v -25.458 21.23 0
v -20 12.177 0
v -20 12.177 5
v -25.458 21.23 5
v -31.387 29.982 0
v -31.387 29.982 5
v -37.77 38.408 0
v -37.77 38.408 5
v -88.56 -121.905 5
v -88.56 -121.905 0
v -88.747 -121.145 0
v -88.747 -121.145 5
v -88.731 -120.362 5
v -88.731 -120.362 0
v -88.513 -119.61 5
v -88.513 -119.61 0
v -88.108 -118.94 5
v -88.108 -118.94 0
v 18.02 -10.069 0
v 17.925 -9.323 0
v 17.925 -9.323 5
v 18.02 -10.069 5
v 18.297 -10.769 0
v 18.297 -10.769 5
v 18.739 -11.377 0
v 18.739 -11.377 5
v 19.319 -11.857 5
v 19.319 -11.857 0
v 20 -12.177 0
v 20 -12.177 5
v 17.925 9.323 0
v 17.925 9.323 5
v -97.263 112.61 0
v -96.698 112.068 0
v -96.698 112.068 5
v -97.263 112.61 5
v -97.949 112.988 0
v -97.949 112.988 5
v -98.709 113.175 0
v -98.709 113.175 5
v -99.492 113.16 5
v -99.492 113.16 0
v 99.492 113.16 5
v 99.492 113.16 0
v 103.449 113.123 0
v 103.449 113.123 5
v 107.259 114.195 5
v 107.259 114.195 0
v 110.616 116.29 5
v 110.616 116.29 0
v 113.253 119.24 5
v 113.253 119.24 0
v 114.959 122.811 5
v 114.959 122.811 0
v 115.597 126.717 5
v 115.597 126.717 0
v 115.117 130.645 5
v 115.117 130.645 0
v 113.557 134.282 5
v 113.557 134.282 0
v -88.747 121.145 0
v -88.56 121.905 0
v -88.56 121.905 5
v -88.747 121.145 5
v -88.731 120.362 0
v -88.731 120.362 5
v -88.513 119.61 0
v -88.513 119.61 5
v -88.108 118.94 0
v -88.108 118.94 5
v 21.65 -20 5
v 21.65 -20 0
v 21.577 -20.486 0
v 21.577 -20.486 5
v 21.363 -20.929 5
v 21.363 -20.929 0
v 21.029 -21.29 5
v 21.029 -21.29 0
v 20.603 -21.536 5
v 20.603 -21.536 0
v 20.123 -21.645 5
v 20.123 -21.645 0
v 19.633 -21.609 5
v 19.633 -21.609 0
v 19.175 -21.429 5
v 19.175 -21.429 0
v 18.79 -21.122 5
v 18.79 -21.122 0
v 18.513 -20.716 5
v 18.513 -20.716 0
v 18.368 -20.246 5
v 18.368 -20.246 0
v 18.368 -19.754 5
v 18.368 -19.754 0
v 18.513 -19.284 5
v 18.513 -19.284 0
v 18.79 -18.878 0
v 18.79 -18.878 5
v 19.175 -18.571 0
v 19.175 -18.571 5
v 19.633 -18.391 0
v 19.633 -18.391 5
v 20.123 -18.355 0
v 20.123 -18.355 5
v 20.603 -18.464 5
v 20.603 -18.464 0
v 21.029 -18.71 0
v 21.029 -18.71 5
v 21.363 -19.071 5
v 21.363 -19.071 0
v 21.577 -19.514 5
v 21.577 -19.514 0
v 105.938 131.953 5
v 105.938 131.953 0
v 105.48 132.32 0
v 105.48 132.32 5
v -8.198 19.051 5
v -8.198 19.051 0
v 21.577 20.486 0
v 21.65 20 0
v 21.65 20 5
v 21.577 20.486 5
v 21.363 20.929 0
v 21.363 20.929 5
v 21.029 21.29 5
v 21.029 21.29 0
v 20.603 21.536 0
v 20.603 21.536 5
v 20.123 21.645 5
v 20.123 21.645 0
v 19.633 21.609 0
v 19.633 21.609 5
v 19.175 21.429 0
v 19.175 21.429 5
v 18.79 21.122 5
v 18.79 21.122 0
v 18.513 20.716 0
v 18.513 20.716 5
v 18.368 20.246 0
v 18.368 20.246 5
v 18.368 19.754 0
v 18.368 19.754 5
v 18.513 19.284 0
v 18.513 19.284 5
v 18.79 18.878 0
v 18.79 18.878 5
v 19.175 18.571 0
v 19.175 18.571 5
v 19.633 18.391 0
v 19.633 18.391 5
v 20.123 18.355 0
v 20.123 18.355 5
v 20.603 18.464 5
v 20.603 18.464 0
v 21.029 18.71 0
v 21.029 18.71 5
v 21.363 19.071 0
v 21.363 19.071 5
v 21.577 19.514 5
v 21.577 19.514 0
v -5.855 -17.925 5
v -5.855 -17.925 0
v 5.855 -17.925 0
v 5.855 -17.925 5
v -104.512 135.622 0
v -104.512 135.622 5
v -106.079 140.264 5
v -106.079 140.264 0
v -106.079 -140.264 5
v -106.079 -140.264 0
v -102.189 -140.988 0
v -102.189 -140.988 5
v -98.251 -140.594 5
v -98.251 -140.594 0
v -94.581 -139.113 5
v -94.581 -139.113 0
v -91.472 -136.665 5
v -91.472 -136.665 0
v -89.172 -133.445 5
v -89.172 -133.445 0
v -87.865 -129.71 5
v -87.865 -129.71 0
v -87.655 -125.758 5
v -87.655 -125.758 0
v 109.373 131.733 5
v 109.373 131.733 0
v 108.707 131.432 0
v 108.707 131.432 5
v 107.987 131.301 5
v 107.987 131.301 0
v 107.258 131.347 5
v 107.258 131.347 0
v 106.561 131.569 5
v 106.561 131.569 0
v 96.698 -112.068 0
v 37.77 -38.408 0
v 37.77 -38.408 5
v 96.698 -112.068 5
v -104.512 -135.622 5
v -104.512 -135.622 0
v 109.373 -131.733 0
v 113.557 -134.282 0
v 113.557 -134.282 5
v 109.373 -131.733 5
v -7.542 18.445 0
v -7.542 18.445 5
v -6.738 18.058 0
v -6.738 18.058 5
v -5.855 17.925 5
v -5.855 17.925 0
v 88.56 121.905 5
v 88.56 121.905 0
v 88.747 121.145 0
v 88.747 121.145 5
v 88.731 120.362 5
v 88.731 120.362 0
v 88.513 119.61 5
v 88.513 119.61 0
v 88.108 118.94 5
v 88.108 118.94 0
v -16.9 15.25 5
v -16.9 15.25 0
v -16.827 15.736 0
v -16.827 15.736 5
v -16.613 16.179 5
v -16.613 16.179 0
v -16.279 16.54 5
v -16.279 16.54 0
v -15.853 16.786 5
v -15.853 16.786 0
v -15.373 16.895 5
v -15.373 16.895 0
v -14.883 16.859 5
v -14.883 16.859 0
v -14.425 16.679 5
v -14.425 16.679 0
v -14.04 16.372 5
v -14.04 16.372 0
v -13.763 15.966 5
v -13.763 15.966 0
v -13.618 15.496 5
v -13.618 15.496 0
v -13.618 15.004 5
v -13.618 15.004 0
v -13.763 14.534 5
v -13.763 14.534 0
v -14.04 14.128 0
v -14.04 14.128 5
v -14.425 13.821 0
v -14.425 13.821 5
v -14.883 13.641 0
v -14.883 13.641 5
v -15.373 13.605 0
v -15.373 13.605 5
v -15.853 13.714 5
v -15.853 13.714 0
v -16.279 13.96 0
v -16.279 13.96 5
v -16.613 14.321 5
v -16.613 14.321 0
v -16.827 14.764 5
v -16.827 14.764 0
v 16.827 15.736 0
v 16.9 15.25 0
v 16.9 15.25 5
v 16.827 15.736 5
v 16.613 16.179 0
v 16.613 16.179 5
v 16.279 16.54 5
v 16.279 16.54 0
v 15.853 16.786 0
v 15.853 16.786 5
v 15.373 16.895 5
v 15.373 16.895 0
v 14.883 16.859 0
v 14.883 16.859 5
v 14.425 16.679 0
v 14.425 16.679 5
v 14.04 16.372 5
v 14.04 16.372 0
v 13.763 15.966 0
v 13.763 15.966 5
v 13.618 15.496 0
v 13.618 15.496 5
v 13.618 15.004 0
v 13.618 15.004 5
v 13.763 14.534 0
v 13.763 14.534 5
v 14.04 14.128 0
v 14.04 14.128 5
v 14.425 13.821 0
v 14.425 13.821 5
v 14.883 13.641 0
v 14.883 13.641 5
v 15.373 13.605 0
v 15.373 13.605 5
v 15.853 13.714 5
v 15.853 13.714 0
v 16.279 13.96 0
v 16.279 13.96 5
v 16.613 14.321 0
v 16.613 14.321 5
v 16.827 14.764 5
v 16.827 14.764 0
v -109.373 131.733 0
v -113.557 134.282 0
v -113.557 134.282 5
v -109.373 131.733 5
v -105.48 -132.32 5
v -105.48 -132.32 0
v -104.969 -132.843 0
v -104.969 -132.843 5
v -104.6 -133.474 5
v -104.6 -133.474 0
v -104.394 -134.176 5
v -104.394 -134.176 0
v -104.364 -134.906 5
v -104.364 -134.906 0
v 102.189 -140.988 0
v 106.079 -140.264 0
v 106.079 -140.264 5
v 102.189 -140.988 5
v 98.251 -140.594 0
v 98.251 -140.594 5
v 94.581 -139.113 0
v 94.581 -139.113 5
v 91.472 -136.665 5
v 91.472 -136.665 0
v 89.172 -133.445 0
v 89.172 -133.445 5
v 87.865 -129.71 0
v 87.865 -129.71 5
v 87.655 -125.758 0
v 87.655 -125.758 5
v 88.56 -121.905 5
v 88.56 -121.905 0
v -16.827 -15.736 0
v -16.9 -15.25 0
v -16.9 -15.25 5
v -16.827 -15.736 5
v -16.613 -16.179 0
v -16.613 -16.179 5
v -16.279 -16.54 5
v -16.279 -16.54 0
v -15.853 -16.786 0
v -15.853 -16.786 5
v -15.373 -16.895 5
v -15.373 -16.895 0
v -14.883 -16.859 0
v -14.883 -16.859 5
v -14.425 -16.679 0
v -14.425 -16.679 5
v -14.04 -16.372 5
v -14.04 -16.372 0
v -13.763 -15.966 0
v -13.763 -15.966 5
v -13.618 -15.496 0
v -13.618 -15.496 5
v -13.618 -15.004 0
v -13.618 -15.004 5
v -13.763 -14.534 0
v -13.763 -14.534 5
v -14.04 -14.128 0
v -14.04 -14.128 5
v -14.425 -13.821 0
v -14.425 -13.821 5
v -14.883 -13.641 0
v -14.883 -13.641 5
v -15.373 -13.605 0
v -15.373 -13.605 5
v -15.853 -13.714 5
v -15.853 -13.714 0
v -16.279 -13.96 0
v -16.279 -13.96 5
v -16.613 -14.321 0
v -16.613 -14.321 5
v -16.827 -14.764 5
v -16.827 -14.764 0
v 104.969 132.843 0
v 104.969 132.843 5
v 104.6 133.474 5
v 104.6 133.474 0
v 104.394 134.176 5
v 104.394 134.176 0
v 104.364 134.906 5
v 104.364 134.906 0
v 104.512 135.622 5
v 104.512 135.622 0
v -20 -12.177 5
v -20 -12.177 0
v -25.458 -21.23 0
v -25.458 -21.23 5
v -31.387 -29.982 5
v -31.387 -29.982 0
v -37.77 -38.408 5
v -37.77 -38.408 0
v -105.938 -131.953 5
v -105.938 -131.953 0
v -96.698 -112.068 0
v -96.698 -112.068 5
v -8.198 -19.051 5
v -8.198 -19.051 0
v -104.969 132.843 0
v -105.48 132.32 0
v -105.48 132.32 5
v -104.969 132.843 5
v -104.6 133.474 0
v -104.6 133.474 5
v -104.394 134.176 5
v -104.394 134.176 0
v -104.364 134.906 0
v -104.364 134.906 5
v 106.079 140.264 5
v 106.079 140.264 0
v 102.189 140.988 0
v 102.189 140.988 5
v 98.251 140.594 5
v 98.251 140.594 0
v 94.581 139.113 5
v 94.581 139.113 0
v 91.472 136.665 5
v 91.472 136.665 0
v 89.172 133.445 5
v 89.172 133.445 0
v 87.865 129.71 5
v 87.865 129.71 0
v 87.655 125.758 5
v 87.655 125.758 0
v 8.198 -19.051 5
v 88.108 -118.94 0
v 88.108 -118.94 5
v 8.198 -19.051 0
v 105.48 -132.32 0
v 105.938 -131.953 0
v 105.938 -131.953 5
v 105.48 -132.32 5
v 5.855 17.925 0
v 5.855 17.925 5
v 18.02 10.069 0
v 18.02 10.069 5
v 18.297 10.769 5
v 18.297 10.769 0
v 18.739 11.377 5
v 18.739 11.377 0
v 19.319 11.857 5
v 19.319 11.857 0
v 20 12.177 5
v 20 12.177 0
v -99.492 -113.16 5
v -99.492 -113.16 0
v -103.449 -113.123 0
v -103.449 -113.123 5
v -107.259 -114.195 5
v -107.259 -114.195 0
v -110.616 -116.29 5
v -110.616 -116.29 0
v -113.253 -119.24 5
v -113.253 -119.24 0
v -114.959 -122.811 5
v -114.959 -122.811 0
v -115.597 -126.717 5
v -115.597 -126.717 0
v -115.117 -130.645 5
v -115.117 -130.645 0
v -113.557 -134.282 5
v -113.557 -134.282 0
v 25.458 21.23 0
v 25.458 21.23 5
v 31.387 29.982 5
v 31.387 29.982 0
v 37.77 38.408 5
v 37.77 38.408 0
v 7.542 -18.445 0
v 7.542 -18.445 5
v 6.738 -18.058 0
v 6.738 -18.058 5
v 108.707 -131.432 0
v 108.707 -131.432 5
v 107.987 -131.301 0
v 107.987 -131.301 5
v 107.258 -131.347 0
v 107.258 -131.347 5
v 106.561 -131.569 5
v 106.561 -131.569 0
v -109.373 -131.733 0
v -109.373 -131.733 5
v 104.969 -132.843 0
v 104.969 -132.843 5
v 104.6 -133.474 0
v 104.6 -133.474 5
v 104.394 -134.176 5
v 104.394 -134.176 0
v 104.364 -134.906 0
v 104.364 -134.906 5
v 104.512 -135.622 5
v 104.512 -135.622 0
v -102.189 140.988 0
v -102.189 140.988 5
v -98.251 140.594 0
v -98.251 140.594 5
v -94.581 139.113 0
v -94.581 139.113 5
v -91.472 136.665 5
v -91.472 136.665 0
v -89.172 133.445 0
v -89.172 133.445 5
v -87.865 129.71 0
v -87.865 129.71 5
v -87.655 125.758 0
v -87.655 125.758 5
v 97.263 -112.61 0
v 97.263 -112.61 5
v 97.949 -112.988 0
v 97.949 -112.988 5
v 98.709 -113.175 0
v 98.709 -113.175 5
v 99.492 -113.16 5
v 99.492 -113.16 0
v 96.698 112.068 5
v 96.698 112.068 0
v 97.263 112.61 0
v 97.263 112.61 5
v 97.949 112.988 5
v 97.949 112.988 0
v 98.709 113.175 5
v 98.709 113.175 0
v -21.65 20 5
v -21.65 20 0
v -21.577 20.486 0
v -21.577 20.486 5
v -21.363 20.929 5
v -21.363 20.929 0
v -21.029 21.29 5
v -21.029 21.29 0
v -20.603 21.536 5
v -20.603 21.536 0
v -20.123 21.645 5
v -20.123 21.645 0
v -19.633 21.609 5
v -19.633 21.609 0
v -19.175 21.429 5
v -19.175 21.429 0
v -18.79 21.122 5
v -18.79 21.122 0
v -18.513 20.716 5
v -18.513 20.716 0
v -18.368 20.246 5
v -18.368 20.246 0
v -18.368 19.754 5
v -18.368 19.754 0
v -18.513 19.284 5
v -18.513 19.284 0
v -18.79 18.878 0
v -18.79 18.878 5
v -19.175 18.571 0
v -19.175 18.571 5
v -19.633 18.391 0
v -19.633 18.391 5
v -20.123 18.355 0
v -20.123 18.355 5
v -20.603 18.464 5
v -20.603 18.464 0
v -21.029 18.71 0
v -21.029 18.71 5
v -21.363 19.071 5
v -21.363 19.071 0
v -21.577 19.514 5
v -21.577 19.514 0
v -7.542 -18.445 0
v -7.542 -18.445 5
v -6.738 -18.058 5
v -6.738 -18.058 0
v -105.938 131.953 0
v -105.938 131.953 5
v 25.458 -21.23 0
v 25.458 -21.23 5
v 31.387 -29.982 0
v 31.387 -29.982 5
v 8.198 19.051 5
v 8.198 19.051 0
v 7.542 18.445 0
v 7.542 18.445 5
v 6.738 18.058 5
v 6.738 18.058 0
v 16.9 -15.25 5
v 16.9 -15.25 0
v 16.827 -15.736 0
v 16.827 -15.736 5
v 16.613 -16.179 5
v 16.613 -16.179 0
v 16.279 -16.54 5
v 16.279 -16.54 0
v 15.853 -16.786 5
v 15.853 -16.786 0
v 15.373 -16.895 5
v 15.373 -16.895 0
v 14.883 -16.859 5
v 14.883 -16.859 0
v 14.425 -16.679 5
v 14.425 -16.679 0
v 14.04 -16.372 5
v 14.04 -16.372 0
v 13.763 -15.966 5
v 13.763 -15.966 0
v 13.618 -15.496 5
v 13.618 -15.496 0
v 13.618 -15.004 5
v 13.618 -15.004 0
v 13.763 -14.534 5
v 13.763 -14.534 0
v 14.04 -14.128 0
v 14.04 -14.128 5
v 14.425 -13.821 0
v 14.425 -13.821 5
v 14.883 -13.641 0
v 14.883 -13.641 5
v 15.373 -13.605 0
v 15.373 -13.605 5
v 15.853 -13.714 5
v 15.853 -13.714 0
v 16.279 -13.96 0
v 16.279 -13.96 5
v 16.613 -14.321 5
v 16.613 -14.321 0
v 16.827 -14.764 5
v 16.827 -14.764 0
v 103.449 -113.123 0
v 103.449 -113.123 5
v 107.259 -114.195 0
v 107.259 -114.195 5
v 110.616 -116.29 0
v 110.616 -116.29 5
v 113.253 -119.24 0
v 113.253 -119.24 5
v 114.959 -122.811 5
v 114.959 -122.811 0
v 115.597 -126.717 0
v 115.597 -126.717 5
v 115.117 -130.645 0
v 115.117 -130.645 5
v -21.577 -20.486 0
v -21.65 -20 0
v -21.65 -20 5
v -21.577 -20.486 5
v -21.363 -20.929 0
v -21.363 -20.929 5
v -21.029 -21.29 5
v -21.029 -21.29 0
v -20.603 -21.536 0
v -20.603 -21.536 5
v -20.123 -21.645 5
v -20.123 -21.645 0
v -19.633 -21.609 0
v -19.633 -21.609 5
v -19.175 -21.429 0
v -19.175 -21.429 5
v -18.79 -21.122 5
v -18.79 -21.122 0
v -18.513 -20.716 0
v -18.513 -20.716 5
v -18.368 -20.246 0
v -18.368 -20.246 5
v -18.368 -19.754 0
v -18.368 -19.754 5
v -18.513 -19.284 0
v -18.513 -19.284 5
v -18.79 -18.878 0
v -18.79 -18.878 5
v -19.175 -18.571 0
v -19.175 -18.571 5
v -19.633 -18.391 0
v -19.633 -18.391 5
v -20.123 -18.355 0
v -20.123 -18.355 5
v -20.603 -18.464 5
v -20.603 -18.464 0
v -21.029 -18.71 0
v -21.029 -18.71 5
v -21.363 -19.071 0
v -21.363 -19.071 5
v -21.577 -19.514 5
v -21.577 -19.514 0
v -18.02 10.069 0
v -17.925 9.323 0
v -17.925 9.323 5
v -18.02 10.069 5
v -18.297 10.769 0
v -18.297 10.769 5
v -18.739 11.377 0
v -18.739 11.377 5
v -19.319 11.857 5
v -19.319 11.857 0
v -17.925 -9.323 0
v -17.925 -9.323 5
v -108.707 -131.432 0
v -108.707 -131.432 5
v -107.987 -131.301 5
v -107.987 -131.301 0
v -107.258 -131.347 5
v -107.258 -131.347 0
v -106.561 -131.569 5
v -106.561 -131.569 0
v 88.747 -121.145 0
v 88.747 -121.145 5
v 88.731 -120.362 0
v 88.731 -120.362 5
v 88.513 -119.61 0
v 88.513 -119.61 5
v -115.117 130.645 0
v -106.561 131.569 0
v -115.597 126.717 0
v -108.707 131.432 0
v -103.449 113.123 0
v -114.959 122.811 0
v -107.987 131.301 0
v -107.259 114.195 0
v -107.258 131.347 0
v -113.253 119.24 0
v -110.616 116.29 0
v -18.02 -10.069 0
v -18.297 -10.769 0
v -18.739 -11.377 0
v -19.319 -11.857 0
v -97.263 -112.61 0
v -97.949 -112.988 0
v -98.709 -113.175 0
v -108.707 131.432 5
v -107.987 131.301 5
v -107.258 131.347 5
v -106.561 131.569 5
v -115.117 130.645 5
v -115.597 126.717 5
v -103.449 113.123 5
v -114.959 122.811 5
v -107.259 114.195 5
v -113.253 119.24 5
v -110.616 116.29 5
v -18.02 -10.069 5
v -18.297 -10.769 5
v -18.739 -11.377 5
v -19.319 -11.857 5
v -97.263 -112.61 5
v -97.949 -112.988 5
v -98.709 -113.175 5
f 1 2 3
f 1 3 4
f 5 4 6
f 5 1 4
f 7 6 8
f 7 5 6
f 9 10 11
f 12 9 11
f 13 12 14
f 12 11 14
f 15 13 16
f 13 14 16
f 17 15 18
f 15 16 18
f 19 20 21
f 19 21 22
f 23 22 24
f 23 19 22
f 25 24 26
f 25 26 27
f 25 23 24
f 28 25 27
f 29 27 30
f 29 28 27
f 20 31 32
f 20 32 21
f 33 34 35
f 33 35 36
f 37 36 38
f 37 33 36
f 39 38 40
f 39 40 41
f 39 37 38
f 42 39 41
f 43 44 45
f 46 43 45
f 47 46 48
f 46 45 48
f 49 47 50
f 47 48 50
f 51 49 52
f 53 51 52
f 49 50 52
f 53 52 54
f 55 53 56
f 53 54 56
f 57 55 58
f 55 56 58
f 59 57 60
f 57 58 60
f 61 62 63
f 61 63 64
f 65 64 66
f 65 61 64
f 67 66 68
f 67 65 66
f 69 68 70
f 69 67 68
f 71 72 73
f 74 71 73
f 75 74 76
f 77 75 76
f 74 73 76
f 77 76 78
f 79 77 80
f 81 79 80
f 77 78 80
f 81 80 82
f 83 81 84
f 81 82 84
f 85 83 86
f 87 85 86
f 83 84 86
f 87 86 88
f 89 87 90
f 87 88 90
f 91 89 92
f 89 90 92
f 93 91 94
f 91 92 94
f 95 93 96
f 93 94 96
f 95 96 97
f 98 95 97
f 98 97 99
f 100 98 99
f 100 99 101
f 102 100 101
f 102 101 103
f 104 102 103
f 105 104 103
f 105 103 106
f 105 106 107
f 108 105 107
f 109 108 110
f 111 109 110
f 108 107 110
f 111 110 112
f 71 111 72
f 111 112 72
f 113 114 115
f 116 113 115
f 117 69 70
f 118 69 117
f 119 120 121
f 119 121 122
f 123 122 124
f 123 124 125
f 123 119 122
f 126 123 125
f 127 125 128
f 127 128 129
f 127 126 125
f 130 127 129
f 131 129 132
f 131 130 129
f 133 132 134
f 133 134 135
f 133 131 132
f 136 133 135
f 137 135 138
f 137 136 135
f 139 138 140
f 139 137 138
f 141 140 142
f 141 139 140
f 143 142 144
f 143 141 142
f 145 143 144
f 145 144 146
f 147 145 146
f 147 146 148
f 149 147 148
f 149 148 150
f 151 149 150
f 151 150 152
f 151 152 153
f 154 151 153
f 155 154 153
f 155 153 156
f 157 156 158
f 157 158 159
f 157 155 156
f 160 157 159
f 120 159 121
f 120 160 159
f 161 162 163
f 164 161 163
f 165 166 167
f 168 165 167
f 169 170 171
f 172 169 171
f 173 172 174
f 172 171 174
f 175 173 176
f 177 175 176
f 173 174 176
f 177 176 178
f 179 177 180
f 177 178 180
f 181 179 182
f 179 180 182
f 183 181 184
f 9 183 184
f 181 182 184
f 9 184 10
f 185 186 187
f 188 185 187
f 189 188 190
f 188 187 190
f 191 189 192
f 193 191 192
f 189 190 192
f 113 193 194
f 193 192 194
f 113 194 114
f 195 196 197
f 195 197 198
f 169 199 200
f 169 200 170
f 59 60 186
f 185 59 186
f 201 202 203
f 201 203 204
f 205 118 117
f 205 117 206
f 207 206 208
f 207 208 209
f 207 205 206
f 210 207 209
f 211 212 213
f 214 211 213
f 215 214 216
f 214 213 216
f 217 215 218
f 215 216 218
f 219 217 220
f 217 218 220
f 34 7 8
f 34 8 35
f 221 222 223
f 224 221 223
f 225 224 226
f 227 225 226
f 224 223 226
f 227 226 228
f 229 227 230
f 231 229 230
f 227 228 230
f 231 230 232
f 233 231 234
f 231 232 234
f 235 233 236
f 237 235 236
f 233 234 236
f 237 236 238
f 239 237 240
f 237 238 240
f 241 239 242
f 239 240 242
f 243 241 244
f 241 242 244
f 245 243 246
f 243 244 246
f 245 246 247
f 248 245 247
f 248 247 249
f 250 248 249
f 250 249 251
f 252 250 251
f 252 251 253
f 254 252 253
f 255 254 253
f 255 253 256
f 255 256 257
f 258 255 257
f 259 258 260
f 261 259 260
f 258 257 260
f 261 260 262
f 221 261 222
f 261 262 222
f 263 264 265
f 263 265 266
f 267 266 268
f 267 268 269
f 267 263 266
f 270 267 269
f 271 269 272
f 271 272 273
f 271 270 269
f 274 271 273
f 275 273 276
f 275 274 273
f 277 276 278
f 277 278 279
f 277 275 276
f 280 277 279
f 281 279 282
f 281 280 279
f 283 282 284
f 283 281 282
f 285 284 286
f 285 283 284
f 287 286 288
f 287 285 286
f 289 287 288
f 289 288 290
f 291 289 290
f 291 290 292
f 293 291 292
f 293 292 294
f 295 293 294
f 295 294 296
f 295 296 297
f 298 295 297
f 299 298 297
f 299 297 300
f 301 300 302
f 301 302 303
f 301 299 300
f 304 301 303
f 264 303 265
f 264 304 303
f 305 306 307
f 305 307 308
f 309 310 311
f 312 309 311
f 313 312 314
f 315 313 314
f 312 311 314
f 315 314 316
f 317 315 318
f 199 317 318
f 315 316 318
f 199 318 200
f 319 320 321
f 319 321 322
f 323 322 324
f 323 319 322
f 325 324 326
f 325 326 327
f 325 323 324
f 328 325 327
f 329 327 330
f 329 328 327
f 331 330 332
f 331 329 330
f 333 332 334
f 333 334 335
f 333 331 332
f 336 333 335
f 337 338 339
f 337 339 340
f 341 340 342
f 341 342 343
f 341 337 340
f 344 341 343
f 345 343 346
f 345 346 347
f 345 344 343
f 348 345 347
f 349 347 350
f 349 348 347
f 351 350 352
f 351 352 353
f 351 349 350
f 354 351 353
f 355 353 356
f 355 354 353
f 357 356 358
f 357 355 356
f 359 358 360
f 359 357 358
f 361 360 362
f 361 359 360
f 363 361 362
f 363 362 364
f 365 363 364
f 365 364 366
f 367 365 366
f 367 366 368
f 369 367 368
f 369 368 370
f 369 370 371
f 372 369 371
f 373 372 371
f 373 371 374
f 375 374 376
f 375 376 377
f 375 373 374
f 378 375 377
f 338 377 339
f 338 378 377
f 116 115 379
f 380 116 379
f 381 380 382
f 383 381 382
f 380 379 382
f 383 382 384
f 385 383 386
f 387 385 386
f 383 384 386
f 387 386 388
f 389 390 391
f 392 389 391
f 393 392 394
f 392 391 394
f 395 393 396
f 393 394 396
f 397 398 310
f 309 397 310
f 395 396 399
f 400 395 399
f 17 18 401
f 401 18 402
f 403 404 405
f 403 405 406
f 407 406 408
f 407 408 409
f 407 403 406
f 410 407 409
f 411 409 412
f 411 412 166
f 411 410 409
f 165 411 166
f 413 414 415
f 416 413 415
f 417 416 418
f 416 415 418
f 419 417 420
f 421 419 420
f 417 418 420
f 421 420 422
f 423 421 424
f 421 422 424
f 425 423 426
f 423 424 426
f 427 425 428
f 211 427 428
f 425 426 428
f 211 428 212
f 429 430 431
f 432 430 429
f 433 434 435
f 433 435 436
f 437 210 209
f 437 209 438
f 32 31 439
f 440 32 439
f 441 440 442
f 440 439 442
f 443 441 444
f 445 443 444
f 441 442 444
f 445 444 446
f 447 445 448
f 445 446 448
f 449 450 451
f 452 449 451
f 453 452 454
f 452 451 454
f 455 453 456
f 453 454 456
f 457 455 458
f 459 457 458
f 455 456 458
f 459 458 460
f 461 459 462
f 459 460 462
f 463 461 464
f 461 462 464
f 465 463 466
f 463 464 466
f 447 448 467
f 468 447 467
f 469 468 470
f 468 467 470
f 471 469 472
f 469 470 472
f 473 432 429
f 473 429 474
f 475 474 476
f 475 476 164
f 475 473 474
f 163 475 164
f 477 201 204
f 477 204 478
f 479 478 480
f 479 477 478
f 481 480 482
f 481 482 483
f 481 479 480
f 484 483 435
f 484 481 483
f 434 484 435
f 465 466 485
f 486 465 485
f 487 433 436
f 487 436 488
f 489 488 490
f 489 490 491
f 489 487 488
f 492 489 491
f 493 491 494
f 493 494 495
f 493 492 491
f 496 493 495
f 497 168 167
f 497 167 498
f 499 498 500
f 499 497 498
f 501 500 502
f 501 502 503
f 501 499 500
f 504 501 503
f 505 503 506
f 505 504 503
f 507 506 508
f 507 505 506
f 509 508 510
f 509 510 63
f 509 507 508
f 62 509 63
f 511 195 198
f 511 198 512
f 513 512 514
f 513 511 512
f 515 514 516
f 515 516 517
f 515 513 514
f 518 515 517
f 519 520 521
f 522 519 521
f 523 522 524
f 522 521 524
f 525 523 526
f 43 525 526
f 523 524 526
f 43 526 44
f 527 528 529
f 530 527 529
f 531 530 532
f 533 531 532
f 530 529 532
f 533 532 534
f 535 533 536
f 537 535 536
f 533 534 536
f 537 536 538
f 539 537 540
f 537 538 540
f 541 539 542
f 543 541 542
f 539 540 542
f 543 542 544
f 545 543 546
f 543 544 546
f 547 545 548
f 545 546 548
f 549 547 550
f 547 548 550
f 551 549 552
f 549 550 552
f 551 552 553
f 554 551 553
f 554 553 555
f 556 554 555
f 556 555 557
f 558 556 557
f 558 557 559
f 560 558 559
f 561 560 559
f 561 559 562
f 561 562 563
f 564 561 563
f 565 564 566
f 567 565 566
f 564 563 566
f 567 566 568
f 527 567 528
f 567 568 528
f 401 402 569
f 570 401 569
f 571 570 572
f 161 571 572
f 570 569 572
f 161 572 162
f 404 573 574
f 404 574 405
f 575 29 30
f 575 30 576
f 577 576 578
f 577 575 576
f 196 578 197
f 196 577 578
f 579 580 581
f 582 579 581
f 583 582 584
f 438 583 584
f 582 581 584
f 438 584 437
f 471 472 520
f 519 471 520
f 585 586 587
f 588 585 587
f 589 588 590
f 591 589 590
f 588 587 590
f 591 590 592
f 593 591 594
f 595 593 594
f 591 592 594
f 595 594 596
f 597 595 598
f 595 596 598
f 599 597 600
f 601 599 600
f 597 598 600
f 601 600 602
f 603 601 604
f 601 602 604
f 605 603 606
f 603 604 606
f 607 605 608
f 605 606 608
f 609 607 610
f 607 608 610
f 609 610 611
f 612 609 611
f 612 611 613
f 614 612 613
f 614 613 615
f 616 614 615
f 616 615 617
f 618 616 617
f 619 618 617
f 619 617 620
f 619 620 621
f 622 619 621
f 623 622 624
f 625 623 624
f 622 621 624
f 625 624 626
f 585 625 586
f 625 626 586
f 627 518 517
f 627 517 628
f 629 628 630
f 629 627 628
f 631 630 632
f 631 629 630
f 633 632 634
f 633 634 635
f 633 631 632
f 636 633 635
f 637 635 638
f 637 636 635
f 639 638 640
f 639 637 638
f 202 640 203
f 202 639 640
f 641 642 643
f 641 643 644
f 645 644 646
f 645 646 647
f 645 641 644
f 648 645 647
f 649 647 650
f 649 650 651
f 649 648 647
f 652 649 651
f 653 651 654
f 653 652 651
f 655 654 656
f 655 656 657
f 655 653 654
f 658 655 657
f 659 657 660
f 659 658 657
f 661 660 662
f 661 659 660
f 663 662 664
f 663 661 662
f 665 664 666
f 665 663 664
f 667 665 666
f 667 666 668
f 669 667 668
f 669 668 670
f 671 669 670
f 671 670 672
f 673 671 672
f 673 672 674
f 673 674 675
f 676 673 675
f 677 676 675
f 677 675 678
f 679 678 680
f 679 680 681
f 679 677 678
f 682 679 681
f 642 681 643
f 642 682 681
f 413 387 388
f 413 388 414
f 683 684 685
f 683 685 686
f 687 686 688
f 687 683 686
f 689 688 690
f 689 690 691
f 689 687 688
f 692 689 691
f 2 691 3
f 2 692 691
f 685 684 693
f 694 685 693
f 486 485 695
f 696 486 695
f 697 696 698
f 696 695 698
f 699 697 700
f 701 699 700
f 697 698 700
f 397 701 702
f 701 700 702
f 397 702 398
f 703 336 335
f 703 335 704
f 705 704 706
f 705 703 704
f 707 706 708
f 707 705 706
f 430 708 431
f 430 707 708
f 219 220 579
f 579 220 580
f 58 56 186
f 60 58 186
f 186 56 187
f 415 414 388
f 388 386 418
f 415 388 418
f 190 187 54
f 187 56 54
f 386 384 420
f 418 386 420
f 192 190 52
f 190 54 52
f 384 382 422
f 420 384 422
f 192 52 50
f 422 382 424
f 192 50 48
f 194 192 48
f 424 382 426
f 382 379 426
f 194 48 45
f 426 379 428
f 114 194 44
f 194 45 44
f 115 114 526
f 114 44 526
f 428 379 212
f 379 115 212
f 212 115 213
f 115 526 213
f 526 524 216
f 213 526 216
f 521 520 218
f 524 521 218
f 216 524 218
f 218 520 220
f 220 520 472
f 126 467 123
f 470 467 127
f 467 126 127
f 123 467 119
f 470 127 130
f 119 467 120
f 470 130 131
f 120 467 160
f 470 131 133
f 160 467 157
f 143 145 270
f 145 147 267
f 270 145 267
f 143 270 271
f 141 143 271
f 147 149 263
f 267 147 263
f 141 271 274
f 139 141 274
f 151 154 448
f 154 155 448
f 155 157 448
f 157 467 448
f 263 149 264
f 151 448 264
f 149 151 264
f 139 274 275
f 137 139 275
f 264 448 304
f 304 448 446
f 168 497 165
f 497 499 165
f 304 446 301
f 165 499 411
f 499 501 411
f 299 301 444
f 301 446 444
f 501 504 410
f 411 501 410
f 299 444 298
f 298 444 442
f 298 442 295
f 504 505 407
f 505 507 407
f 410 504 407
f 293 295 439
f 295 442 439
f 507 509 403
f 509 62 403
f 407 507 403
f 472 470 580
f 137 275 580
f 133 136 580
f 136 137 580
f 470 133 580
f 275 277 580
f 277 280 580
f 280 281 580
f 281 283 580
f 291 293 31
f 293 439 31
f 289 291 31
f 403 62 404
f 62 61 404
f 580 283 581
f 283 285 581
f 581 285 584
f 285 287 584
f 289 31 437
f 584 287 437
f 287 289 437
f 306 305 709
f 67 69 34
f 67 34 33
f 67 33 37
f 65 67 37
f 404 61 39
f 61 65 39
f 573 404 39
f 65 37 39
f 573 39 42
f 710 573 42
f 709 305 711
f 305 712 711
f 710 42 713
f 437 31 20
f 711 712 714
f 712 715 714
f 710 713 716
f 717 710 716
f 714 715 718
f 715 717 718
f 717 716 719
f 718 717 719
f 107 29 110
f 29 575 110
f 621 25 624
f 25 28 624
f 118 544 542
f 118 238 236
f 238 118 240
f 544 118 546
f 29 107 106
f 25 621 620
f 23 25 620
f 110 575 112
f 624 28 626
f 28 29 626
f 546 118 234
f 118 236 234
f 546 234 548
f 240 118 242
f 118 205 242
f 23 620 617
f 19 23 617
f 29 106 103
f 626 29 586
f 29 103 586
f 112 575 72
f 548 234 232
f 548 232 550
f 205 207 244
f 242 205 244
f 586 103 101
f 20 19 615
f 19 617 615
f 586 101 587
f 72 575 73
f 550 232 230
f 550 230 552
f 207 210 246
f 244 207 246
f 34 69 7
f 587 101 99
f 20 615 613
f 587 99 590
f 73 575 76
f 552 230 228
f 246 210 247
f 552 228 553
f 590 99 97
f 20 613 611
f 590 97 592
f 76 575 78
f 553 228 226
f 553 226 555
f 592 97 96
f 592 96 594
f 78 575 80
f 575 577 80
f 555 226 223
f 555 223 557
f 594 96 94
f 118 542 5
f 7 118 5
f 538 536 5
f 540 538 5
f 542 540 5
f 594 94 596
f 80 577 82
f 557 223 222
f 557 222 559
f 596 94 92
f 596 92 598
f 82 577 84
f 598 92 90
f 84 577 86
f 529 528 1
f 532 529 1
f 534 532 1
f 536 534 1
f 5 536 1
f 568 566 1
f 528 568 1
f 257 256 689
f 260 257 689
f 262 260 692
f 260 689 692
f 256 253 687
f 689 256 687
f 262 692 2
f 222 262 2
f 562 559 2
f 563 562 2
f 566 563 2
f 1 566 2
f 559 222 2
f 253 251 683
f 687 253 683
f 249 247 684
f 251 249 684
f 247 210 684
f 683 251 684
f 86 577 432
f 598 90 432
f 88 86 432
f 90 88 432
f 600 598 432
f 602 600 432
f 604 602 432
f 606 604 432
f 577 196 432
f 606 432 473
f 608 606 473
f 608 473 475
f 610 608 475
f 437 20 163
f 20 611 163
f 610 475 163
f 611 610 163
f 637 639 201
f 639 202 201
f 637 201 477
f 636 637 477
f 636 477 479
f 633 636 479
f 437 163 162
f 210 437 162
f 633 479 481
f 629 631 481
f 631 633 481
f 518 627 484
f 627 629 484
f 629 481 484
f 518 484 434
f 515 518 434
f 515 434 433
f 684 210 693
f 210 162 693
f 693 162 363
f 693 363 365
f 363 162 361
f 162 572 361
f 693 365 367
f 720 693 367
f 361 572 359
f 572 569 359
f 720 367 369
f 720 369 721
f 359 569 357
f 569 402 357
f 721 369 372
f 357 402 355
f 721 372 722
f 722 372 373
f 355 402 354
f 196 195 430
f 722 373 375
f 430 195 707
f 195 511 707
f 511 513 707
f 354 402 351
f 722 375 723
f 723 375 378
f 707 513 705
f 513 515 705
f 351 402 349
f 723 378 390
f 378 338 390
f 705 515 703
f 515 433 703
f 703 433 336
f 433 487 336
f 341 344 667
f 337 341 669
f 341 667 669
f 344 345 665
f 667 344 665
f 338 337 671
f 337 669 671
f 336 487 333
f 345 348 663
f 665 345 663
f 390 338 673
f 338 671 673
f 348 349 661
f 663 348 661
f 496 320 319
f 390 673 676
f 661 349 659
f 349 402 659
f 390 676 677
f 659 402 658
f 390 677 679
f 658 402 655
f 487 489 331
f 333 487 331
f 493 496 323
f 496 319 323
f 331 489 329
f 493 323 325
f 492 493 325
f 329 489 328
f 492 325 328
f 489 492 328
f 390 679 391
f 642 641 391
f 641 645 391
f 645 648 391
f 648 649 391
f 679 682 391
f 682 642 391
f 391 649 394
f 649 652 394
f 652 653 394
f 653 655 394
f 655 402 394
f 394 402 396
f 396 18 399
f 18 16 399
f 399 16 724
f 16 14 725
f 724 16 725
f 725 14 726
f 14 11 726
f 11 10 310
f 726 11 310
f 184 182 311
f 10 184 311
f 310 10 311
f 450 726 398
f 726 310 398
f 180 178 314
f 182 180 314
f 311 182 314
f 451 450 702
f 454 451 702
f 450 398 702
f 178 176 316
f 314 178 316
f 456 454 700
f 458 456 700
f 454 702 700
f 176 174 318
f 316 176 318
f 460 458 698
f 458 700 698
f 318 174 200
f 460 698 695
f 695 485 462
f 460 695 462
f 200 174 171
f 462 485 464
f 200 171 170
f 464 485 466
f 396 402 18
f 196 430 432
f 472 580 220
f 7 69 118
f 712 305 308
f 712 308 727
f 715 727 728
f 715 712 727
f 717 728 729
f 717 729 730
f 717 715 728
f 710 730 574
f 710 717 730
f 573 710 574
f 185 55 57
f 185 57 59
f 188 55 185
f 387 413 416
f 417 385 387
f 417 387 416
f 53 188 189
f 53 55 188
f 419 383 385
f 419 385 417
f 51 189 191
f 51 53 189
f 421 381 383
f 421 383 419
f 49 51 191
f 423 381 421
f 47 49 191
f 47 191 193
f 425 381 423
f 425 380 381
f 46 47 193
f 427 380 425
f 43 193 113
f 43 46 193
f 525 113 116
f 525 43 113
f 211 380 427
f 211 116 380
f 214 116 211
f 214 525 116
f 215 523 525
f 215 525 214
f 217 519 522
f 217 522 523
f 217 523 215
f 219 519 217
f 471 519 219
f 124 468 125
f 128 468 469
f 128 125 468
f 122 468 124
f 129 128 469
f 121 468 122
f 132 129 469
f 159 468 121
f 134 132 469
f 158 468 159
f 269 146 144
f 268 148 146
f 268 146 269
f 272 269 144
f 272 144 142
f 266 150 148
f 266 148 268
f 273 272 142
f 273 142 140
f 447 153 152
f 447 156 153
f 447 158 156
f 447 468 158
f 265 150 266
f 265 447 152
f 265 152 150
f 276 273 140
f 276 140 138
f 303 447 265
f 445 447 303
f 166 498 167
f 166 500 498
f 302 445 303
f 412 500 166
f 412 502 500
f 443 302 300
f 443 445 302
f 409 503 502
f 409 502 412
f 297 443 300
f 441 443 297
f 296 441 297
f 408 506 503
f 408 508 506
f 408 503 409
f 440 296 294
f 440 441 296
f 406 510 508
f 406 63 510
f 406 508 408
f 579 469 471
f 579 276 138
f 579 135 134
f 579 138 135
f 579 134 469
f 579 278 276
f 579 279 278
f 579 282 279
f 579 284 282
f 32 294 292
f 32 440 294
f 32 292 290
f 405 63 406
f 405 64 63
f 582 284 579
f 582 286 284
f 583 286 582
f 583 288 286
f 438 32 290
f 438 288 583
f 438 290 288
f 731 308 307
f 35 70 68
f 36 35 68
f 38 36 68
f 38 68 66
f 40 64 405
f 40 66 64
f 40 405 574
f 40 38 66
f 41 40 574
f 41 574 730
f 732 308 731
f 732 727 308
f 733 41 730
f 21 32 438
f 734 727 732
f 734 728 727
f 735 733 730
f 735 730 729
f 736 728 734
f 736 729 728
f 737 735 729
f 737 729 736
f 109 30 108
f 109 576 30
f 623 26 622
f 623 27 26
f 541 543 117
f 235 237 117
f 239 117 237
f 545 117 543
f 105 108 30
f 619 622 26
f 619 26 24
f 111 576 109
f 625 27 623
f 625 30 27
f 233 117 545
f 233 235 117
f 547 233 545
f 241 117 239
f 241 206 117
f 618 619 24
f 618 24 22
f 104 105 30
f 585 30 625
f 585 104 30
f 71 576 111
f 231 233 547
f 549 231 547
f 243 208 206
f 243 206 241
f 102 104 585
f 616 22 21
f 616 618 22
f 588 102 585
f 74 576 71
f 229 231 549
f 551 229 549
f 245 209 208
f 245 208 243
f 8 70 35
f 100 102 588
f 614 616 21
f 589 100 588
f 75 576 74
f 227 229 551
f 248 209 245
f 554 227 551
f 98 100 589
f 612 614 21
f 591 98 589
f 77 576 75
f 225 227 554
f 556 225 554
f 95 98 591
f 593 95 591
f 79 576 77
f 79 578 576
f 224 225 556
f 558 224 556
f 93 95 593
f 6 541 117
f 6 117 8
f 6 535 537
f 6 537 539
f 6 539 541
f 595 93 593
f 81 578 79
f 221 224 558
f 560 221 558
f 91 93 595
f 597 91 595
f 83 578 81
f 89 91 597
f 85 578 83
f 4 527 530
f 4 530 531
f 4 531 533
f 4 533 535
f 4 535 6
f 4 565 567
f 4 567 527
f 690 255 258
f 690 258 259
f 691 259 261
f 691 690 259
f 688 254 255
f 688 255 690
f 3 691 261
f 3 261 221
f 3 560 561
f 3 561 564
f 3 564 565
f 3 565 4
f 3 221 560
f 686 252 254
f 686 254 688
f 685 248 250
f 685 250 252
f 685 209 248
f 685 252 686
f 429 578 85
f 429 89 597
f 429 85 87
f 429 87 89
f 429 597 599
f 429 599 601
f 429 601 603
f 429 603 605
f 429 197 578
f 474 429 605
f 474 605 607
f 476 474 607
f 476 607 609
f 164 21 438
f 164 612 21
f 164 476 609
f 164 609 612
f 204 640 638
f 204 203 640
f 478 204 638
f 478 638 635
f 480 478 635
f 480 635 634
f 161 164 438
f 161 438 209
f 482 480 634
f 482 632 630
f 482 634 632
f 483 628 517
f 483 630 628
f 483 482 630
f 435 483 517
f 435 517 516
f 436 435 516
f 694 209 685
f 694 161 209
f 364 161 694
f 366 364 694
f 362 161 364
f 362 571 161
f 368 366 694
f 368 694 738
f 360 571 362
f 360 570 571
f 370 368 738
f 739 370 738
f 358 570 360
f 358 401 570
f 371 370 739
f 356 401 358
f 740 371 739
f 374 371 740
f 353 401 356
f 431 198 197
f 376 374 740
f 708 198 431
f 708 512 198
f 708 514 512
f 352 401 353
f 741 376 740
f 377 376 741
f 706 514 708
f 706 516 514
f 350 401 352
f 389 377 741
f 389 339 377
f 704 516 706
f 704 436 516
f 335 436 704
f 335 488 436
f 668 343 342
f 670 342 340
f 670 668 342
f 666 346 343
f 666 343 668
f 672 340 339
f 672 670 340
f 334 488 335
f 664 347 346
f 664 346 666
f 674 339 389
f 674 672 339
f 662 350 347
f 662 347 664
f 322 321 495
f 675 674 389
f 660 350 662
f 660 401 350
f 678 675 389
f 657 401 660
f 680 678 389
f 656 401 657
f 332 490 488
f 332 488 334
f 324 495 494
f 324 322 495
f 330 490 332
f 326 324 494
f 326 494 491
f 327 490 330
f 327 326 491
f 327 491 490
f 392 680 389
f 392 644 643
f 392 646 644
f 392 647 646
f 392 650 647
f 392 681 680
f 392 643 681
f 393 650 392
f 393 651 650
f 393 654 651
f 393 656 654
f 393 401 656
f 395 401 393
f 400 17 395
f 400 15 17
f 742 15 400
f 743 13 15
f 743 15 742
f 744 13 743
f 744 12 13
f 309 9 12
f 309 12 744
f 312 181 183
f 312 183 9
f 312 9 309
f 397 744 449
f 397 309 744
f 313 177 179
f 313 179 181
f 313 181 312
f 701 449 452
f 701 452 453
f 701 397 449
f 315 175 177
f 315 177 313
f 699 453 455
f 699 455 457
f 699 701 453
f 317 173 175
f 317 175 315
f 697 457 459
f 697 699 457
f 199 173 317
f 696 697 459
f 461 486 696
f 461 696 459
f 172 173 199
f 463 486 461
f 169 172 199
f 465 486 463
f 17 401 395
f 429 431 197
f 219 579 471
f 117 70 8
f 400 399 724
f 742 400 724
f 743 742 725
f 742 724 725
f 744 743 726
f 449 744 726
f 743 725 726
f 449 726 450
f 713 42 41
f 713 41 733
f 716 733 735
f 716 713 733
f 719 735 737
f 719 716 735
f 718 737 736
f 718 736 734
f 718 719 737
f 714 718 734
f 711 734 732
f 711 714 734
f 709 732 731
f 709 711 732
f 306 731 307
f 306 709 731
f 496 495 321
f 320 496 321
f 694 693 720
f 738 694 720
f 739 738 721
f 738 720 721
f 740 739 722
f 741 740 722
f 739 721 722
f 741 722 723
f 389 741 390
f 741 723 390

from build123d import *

# Parameters (mm, degrees)
F0_R        = 1.65
F1_DEPTH    = 5
F2_T1_DEPTH = 5
F3_T1_DEPTH = 5


# Not quite as in the source:
# - a fillet or chamfer that OpenCascade refuses, or shapes differently, is made with other operations: its cross-section is extruded or revolved along the edge and cut away or added


with BuildPart() as f1:
    # F0 (on Top) → F1 (new body)
    with BuildSketch(Plane.XY):
        Polygon((7.0434366612, 0), (14.0868733224, 0), (17.9254915565, 0), (17.9254915565, 12.1765555814), (17.9254915565, 13.6025686192), align=None)
        Polygon((0, 0), (7.0434366612, 0), (17.9254915565, 13.6025686192), (17.9254915565, 17.9254915565), (7.296956584, 17.9254915565), (0, 8.8042958265), align=None)
        with Locations((15.25, 15.25)):
            Circle(F0_R, mode=Mode.SUBTRACT)
        with BuildLine():
            Line((17.9254915565, 17.9254915565), (17.9254915565, 13.6025686192))
            Line((17.9254915565, 13.6025686192), (17.9254915565, 12.1765555814))
            Line((17.9254915565, 12.1765555814), (20, 12.1765555814))
            Line((20, 12.1765555814), (23.3218736491, 20.3480462349))
            Line((23.3218736491, 20.3480462349), (97.8522087861, 113.5109651562))
            ThreePointArc((97.8522087861, 113.5109651562), (92.8542693342, 116.0678366678), (89.2626518823, 120.3826106793))
            Line((89.2626518823, 120.3826106793), (7.296956584, 17.9254915565))
            Line((7.296956584, 17.9254915565), (17.9254915565, 17.9254915565))
        make_face()
        with Locations((20, 20)):
            Circle(F0_R, mode=Mode.SUBTRACT)
        Polygon((0, 17.9254915565), (0, 8.8042958265), (7.296956584, 17.9254915565), align=None)
        with BuildLine():
            ThreePointArc((106.0792785003, 140.2640892683), (90.9109583101, 136.0412602966), (89.2626518823, 120.3826106793))
            ThreePointArc((89.2626518823, 120.3826106793), (92.8542693342, 116.0678366678), (97.8522087861, 113.5109651562))
            ThreePointArc((97.8522087861, 113.5109651562), (112.7671167579, 118.5563335383), (113.5573186397, 134.2816571567))
            Line((113.5573186397, 134.2816571567), (107.5786593199, 130.6408285784))
            Line((107.5786593199, 130.6408285784), (103.8396392501, 133.6320446341))
            Line((103.8396392501, 133.6320446341), (106.0792785003, 140.2640892683))
        make_face()
    extrude(amount=F1_DEPTH)

    # F2: fillet of radius 3 on 6 edges, made by hand

    # F2_s2 → F2_t1 (join)
    with BuildSketch(Plane.XY):
        with BuildLine():
            ThreePointArc((8.1976884699, 19.0514064139), (7.1546482331, 18.2215818476), (5.8550820416, 17.9254915565))
            Line((5.8550820416, 17.9254915565), (7.296956584, 17.9254915565))
            Line((7.296956584, 17.9254915565), (8.1976884699, 19.0514064139))
        make_face()
        with BuildLine():
            ThreePointArc((17.9254915565, 9.3228798152), (18.4989225106, 11.0868987111), (20, 12.1765555814))
            Line((20, 12.1765555814), (17.9254915565, 12.1765555814))
            Line((17.9254915565, 12.1765555814), (17.9254915565, 9.3228798152))
        make_face()
        with BuildLine():
            ThreePointArc((96.6977481783, 112.0678893964), (97.9486405, 112.9881128103), (99.4920567349, 113.1596035031))
            ThreePointArc((99.4920567349, 113.1596035031), (98.6668668075, 113.3107074808), (97.8522087861, 113.5109651562))
            Line((97.8522087861, 113.5109651562), (96.6977481783, 112.0678893964))
        make_face()
        with BuildLine():
            ThreePointArc((88.5598934027, 121.9053341689), (88.7313840955, 120.361917934), (88.1081912745, 118.9395349195))
            Line((88.1081912745, 118.9395349195), (89.2626518823, 120.3826106793))
            ThreePointArc((89.2626518823, 120.3826106793), (88.8884511699, 121.1334399909), (88.5598934027, 121.9053341689))
        make_face()
        with BuildLine():
            ThreePointArc((105.4799499303, 132.31979609), (104.4752105502, 133.8183827512), (104.5117302298, 135.6222479112))
            Line((104.5117302298, 135.6222479112), (103.8396392501, 133.6320446341))
            Line((103.8396392501, 133.6320446341), (105.4799499303, 132.31979609))
        make_face()
        with BuildLine():
            ThreePointArc((109.3727888874, 131.7334009852), (107.6209369535, 131.3018016285), (105.9383486397, 131.9530771225))
            Line((105.9383486397, 131.9530771225), (107.5786593199, 130.6408285784))
            Line((107.5786593199, 130.6408285784), (109.3727888874, 131.7334009852))
        make_face()
    extrude(amount=F2_T1_DEPTH)

    # F3: fillet of radius 199.9181440352 on 1 edges, made by hand

    # F3_s2 → F3_t1 (join)
    with BuildSketch(Plane.XY):
        with BuildLine():
            ThreePointArc((20, 12.1765555814), (28.3645778619, 25.6450570093), (37.770134119, 38.4083718223))
            Line((37.770134119, 38.4083718223), (23.3218736491, 20.3480462349))
            Line((23.3218736491, 20.3480462349), (20, 12.1765555814))
        make_face()
    extrude(amount=F3_T1_DEPTH)

    # F4: F1 across plane


with BuildPart() as f1_1:
    add(f1.part)
    add(f1.part.mirror(Plane.YZ))

    # F5: F1 across plane


with BuildPart() as f1_2:
    add(f1_1.part)
    add(f1_1.part.mirror(Plane.XZ))


solid = f1_2.part
